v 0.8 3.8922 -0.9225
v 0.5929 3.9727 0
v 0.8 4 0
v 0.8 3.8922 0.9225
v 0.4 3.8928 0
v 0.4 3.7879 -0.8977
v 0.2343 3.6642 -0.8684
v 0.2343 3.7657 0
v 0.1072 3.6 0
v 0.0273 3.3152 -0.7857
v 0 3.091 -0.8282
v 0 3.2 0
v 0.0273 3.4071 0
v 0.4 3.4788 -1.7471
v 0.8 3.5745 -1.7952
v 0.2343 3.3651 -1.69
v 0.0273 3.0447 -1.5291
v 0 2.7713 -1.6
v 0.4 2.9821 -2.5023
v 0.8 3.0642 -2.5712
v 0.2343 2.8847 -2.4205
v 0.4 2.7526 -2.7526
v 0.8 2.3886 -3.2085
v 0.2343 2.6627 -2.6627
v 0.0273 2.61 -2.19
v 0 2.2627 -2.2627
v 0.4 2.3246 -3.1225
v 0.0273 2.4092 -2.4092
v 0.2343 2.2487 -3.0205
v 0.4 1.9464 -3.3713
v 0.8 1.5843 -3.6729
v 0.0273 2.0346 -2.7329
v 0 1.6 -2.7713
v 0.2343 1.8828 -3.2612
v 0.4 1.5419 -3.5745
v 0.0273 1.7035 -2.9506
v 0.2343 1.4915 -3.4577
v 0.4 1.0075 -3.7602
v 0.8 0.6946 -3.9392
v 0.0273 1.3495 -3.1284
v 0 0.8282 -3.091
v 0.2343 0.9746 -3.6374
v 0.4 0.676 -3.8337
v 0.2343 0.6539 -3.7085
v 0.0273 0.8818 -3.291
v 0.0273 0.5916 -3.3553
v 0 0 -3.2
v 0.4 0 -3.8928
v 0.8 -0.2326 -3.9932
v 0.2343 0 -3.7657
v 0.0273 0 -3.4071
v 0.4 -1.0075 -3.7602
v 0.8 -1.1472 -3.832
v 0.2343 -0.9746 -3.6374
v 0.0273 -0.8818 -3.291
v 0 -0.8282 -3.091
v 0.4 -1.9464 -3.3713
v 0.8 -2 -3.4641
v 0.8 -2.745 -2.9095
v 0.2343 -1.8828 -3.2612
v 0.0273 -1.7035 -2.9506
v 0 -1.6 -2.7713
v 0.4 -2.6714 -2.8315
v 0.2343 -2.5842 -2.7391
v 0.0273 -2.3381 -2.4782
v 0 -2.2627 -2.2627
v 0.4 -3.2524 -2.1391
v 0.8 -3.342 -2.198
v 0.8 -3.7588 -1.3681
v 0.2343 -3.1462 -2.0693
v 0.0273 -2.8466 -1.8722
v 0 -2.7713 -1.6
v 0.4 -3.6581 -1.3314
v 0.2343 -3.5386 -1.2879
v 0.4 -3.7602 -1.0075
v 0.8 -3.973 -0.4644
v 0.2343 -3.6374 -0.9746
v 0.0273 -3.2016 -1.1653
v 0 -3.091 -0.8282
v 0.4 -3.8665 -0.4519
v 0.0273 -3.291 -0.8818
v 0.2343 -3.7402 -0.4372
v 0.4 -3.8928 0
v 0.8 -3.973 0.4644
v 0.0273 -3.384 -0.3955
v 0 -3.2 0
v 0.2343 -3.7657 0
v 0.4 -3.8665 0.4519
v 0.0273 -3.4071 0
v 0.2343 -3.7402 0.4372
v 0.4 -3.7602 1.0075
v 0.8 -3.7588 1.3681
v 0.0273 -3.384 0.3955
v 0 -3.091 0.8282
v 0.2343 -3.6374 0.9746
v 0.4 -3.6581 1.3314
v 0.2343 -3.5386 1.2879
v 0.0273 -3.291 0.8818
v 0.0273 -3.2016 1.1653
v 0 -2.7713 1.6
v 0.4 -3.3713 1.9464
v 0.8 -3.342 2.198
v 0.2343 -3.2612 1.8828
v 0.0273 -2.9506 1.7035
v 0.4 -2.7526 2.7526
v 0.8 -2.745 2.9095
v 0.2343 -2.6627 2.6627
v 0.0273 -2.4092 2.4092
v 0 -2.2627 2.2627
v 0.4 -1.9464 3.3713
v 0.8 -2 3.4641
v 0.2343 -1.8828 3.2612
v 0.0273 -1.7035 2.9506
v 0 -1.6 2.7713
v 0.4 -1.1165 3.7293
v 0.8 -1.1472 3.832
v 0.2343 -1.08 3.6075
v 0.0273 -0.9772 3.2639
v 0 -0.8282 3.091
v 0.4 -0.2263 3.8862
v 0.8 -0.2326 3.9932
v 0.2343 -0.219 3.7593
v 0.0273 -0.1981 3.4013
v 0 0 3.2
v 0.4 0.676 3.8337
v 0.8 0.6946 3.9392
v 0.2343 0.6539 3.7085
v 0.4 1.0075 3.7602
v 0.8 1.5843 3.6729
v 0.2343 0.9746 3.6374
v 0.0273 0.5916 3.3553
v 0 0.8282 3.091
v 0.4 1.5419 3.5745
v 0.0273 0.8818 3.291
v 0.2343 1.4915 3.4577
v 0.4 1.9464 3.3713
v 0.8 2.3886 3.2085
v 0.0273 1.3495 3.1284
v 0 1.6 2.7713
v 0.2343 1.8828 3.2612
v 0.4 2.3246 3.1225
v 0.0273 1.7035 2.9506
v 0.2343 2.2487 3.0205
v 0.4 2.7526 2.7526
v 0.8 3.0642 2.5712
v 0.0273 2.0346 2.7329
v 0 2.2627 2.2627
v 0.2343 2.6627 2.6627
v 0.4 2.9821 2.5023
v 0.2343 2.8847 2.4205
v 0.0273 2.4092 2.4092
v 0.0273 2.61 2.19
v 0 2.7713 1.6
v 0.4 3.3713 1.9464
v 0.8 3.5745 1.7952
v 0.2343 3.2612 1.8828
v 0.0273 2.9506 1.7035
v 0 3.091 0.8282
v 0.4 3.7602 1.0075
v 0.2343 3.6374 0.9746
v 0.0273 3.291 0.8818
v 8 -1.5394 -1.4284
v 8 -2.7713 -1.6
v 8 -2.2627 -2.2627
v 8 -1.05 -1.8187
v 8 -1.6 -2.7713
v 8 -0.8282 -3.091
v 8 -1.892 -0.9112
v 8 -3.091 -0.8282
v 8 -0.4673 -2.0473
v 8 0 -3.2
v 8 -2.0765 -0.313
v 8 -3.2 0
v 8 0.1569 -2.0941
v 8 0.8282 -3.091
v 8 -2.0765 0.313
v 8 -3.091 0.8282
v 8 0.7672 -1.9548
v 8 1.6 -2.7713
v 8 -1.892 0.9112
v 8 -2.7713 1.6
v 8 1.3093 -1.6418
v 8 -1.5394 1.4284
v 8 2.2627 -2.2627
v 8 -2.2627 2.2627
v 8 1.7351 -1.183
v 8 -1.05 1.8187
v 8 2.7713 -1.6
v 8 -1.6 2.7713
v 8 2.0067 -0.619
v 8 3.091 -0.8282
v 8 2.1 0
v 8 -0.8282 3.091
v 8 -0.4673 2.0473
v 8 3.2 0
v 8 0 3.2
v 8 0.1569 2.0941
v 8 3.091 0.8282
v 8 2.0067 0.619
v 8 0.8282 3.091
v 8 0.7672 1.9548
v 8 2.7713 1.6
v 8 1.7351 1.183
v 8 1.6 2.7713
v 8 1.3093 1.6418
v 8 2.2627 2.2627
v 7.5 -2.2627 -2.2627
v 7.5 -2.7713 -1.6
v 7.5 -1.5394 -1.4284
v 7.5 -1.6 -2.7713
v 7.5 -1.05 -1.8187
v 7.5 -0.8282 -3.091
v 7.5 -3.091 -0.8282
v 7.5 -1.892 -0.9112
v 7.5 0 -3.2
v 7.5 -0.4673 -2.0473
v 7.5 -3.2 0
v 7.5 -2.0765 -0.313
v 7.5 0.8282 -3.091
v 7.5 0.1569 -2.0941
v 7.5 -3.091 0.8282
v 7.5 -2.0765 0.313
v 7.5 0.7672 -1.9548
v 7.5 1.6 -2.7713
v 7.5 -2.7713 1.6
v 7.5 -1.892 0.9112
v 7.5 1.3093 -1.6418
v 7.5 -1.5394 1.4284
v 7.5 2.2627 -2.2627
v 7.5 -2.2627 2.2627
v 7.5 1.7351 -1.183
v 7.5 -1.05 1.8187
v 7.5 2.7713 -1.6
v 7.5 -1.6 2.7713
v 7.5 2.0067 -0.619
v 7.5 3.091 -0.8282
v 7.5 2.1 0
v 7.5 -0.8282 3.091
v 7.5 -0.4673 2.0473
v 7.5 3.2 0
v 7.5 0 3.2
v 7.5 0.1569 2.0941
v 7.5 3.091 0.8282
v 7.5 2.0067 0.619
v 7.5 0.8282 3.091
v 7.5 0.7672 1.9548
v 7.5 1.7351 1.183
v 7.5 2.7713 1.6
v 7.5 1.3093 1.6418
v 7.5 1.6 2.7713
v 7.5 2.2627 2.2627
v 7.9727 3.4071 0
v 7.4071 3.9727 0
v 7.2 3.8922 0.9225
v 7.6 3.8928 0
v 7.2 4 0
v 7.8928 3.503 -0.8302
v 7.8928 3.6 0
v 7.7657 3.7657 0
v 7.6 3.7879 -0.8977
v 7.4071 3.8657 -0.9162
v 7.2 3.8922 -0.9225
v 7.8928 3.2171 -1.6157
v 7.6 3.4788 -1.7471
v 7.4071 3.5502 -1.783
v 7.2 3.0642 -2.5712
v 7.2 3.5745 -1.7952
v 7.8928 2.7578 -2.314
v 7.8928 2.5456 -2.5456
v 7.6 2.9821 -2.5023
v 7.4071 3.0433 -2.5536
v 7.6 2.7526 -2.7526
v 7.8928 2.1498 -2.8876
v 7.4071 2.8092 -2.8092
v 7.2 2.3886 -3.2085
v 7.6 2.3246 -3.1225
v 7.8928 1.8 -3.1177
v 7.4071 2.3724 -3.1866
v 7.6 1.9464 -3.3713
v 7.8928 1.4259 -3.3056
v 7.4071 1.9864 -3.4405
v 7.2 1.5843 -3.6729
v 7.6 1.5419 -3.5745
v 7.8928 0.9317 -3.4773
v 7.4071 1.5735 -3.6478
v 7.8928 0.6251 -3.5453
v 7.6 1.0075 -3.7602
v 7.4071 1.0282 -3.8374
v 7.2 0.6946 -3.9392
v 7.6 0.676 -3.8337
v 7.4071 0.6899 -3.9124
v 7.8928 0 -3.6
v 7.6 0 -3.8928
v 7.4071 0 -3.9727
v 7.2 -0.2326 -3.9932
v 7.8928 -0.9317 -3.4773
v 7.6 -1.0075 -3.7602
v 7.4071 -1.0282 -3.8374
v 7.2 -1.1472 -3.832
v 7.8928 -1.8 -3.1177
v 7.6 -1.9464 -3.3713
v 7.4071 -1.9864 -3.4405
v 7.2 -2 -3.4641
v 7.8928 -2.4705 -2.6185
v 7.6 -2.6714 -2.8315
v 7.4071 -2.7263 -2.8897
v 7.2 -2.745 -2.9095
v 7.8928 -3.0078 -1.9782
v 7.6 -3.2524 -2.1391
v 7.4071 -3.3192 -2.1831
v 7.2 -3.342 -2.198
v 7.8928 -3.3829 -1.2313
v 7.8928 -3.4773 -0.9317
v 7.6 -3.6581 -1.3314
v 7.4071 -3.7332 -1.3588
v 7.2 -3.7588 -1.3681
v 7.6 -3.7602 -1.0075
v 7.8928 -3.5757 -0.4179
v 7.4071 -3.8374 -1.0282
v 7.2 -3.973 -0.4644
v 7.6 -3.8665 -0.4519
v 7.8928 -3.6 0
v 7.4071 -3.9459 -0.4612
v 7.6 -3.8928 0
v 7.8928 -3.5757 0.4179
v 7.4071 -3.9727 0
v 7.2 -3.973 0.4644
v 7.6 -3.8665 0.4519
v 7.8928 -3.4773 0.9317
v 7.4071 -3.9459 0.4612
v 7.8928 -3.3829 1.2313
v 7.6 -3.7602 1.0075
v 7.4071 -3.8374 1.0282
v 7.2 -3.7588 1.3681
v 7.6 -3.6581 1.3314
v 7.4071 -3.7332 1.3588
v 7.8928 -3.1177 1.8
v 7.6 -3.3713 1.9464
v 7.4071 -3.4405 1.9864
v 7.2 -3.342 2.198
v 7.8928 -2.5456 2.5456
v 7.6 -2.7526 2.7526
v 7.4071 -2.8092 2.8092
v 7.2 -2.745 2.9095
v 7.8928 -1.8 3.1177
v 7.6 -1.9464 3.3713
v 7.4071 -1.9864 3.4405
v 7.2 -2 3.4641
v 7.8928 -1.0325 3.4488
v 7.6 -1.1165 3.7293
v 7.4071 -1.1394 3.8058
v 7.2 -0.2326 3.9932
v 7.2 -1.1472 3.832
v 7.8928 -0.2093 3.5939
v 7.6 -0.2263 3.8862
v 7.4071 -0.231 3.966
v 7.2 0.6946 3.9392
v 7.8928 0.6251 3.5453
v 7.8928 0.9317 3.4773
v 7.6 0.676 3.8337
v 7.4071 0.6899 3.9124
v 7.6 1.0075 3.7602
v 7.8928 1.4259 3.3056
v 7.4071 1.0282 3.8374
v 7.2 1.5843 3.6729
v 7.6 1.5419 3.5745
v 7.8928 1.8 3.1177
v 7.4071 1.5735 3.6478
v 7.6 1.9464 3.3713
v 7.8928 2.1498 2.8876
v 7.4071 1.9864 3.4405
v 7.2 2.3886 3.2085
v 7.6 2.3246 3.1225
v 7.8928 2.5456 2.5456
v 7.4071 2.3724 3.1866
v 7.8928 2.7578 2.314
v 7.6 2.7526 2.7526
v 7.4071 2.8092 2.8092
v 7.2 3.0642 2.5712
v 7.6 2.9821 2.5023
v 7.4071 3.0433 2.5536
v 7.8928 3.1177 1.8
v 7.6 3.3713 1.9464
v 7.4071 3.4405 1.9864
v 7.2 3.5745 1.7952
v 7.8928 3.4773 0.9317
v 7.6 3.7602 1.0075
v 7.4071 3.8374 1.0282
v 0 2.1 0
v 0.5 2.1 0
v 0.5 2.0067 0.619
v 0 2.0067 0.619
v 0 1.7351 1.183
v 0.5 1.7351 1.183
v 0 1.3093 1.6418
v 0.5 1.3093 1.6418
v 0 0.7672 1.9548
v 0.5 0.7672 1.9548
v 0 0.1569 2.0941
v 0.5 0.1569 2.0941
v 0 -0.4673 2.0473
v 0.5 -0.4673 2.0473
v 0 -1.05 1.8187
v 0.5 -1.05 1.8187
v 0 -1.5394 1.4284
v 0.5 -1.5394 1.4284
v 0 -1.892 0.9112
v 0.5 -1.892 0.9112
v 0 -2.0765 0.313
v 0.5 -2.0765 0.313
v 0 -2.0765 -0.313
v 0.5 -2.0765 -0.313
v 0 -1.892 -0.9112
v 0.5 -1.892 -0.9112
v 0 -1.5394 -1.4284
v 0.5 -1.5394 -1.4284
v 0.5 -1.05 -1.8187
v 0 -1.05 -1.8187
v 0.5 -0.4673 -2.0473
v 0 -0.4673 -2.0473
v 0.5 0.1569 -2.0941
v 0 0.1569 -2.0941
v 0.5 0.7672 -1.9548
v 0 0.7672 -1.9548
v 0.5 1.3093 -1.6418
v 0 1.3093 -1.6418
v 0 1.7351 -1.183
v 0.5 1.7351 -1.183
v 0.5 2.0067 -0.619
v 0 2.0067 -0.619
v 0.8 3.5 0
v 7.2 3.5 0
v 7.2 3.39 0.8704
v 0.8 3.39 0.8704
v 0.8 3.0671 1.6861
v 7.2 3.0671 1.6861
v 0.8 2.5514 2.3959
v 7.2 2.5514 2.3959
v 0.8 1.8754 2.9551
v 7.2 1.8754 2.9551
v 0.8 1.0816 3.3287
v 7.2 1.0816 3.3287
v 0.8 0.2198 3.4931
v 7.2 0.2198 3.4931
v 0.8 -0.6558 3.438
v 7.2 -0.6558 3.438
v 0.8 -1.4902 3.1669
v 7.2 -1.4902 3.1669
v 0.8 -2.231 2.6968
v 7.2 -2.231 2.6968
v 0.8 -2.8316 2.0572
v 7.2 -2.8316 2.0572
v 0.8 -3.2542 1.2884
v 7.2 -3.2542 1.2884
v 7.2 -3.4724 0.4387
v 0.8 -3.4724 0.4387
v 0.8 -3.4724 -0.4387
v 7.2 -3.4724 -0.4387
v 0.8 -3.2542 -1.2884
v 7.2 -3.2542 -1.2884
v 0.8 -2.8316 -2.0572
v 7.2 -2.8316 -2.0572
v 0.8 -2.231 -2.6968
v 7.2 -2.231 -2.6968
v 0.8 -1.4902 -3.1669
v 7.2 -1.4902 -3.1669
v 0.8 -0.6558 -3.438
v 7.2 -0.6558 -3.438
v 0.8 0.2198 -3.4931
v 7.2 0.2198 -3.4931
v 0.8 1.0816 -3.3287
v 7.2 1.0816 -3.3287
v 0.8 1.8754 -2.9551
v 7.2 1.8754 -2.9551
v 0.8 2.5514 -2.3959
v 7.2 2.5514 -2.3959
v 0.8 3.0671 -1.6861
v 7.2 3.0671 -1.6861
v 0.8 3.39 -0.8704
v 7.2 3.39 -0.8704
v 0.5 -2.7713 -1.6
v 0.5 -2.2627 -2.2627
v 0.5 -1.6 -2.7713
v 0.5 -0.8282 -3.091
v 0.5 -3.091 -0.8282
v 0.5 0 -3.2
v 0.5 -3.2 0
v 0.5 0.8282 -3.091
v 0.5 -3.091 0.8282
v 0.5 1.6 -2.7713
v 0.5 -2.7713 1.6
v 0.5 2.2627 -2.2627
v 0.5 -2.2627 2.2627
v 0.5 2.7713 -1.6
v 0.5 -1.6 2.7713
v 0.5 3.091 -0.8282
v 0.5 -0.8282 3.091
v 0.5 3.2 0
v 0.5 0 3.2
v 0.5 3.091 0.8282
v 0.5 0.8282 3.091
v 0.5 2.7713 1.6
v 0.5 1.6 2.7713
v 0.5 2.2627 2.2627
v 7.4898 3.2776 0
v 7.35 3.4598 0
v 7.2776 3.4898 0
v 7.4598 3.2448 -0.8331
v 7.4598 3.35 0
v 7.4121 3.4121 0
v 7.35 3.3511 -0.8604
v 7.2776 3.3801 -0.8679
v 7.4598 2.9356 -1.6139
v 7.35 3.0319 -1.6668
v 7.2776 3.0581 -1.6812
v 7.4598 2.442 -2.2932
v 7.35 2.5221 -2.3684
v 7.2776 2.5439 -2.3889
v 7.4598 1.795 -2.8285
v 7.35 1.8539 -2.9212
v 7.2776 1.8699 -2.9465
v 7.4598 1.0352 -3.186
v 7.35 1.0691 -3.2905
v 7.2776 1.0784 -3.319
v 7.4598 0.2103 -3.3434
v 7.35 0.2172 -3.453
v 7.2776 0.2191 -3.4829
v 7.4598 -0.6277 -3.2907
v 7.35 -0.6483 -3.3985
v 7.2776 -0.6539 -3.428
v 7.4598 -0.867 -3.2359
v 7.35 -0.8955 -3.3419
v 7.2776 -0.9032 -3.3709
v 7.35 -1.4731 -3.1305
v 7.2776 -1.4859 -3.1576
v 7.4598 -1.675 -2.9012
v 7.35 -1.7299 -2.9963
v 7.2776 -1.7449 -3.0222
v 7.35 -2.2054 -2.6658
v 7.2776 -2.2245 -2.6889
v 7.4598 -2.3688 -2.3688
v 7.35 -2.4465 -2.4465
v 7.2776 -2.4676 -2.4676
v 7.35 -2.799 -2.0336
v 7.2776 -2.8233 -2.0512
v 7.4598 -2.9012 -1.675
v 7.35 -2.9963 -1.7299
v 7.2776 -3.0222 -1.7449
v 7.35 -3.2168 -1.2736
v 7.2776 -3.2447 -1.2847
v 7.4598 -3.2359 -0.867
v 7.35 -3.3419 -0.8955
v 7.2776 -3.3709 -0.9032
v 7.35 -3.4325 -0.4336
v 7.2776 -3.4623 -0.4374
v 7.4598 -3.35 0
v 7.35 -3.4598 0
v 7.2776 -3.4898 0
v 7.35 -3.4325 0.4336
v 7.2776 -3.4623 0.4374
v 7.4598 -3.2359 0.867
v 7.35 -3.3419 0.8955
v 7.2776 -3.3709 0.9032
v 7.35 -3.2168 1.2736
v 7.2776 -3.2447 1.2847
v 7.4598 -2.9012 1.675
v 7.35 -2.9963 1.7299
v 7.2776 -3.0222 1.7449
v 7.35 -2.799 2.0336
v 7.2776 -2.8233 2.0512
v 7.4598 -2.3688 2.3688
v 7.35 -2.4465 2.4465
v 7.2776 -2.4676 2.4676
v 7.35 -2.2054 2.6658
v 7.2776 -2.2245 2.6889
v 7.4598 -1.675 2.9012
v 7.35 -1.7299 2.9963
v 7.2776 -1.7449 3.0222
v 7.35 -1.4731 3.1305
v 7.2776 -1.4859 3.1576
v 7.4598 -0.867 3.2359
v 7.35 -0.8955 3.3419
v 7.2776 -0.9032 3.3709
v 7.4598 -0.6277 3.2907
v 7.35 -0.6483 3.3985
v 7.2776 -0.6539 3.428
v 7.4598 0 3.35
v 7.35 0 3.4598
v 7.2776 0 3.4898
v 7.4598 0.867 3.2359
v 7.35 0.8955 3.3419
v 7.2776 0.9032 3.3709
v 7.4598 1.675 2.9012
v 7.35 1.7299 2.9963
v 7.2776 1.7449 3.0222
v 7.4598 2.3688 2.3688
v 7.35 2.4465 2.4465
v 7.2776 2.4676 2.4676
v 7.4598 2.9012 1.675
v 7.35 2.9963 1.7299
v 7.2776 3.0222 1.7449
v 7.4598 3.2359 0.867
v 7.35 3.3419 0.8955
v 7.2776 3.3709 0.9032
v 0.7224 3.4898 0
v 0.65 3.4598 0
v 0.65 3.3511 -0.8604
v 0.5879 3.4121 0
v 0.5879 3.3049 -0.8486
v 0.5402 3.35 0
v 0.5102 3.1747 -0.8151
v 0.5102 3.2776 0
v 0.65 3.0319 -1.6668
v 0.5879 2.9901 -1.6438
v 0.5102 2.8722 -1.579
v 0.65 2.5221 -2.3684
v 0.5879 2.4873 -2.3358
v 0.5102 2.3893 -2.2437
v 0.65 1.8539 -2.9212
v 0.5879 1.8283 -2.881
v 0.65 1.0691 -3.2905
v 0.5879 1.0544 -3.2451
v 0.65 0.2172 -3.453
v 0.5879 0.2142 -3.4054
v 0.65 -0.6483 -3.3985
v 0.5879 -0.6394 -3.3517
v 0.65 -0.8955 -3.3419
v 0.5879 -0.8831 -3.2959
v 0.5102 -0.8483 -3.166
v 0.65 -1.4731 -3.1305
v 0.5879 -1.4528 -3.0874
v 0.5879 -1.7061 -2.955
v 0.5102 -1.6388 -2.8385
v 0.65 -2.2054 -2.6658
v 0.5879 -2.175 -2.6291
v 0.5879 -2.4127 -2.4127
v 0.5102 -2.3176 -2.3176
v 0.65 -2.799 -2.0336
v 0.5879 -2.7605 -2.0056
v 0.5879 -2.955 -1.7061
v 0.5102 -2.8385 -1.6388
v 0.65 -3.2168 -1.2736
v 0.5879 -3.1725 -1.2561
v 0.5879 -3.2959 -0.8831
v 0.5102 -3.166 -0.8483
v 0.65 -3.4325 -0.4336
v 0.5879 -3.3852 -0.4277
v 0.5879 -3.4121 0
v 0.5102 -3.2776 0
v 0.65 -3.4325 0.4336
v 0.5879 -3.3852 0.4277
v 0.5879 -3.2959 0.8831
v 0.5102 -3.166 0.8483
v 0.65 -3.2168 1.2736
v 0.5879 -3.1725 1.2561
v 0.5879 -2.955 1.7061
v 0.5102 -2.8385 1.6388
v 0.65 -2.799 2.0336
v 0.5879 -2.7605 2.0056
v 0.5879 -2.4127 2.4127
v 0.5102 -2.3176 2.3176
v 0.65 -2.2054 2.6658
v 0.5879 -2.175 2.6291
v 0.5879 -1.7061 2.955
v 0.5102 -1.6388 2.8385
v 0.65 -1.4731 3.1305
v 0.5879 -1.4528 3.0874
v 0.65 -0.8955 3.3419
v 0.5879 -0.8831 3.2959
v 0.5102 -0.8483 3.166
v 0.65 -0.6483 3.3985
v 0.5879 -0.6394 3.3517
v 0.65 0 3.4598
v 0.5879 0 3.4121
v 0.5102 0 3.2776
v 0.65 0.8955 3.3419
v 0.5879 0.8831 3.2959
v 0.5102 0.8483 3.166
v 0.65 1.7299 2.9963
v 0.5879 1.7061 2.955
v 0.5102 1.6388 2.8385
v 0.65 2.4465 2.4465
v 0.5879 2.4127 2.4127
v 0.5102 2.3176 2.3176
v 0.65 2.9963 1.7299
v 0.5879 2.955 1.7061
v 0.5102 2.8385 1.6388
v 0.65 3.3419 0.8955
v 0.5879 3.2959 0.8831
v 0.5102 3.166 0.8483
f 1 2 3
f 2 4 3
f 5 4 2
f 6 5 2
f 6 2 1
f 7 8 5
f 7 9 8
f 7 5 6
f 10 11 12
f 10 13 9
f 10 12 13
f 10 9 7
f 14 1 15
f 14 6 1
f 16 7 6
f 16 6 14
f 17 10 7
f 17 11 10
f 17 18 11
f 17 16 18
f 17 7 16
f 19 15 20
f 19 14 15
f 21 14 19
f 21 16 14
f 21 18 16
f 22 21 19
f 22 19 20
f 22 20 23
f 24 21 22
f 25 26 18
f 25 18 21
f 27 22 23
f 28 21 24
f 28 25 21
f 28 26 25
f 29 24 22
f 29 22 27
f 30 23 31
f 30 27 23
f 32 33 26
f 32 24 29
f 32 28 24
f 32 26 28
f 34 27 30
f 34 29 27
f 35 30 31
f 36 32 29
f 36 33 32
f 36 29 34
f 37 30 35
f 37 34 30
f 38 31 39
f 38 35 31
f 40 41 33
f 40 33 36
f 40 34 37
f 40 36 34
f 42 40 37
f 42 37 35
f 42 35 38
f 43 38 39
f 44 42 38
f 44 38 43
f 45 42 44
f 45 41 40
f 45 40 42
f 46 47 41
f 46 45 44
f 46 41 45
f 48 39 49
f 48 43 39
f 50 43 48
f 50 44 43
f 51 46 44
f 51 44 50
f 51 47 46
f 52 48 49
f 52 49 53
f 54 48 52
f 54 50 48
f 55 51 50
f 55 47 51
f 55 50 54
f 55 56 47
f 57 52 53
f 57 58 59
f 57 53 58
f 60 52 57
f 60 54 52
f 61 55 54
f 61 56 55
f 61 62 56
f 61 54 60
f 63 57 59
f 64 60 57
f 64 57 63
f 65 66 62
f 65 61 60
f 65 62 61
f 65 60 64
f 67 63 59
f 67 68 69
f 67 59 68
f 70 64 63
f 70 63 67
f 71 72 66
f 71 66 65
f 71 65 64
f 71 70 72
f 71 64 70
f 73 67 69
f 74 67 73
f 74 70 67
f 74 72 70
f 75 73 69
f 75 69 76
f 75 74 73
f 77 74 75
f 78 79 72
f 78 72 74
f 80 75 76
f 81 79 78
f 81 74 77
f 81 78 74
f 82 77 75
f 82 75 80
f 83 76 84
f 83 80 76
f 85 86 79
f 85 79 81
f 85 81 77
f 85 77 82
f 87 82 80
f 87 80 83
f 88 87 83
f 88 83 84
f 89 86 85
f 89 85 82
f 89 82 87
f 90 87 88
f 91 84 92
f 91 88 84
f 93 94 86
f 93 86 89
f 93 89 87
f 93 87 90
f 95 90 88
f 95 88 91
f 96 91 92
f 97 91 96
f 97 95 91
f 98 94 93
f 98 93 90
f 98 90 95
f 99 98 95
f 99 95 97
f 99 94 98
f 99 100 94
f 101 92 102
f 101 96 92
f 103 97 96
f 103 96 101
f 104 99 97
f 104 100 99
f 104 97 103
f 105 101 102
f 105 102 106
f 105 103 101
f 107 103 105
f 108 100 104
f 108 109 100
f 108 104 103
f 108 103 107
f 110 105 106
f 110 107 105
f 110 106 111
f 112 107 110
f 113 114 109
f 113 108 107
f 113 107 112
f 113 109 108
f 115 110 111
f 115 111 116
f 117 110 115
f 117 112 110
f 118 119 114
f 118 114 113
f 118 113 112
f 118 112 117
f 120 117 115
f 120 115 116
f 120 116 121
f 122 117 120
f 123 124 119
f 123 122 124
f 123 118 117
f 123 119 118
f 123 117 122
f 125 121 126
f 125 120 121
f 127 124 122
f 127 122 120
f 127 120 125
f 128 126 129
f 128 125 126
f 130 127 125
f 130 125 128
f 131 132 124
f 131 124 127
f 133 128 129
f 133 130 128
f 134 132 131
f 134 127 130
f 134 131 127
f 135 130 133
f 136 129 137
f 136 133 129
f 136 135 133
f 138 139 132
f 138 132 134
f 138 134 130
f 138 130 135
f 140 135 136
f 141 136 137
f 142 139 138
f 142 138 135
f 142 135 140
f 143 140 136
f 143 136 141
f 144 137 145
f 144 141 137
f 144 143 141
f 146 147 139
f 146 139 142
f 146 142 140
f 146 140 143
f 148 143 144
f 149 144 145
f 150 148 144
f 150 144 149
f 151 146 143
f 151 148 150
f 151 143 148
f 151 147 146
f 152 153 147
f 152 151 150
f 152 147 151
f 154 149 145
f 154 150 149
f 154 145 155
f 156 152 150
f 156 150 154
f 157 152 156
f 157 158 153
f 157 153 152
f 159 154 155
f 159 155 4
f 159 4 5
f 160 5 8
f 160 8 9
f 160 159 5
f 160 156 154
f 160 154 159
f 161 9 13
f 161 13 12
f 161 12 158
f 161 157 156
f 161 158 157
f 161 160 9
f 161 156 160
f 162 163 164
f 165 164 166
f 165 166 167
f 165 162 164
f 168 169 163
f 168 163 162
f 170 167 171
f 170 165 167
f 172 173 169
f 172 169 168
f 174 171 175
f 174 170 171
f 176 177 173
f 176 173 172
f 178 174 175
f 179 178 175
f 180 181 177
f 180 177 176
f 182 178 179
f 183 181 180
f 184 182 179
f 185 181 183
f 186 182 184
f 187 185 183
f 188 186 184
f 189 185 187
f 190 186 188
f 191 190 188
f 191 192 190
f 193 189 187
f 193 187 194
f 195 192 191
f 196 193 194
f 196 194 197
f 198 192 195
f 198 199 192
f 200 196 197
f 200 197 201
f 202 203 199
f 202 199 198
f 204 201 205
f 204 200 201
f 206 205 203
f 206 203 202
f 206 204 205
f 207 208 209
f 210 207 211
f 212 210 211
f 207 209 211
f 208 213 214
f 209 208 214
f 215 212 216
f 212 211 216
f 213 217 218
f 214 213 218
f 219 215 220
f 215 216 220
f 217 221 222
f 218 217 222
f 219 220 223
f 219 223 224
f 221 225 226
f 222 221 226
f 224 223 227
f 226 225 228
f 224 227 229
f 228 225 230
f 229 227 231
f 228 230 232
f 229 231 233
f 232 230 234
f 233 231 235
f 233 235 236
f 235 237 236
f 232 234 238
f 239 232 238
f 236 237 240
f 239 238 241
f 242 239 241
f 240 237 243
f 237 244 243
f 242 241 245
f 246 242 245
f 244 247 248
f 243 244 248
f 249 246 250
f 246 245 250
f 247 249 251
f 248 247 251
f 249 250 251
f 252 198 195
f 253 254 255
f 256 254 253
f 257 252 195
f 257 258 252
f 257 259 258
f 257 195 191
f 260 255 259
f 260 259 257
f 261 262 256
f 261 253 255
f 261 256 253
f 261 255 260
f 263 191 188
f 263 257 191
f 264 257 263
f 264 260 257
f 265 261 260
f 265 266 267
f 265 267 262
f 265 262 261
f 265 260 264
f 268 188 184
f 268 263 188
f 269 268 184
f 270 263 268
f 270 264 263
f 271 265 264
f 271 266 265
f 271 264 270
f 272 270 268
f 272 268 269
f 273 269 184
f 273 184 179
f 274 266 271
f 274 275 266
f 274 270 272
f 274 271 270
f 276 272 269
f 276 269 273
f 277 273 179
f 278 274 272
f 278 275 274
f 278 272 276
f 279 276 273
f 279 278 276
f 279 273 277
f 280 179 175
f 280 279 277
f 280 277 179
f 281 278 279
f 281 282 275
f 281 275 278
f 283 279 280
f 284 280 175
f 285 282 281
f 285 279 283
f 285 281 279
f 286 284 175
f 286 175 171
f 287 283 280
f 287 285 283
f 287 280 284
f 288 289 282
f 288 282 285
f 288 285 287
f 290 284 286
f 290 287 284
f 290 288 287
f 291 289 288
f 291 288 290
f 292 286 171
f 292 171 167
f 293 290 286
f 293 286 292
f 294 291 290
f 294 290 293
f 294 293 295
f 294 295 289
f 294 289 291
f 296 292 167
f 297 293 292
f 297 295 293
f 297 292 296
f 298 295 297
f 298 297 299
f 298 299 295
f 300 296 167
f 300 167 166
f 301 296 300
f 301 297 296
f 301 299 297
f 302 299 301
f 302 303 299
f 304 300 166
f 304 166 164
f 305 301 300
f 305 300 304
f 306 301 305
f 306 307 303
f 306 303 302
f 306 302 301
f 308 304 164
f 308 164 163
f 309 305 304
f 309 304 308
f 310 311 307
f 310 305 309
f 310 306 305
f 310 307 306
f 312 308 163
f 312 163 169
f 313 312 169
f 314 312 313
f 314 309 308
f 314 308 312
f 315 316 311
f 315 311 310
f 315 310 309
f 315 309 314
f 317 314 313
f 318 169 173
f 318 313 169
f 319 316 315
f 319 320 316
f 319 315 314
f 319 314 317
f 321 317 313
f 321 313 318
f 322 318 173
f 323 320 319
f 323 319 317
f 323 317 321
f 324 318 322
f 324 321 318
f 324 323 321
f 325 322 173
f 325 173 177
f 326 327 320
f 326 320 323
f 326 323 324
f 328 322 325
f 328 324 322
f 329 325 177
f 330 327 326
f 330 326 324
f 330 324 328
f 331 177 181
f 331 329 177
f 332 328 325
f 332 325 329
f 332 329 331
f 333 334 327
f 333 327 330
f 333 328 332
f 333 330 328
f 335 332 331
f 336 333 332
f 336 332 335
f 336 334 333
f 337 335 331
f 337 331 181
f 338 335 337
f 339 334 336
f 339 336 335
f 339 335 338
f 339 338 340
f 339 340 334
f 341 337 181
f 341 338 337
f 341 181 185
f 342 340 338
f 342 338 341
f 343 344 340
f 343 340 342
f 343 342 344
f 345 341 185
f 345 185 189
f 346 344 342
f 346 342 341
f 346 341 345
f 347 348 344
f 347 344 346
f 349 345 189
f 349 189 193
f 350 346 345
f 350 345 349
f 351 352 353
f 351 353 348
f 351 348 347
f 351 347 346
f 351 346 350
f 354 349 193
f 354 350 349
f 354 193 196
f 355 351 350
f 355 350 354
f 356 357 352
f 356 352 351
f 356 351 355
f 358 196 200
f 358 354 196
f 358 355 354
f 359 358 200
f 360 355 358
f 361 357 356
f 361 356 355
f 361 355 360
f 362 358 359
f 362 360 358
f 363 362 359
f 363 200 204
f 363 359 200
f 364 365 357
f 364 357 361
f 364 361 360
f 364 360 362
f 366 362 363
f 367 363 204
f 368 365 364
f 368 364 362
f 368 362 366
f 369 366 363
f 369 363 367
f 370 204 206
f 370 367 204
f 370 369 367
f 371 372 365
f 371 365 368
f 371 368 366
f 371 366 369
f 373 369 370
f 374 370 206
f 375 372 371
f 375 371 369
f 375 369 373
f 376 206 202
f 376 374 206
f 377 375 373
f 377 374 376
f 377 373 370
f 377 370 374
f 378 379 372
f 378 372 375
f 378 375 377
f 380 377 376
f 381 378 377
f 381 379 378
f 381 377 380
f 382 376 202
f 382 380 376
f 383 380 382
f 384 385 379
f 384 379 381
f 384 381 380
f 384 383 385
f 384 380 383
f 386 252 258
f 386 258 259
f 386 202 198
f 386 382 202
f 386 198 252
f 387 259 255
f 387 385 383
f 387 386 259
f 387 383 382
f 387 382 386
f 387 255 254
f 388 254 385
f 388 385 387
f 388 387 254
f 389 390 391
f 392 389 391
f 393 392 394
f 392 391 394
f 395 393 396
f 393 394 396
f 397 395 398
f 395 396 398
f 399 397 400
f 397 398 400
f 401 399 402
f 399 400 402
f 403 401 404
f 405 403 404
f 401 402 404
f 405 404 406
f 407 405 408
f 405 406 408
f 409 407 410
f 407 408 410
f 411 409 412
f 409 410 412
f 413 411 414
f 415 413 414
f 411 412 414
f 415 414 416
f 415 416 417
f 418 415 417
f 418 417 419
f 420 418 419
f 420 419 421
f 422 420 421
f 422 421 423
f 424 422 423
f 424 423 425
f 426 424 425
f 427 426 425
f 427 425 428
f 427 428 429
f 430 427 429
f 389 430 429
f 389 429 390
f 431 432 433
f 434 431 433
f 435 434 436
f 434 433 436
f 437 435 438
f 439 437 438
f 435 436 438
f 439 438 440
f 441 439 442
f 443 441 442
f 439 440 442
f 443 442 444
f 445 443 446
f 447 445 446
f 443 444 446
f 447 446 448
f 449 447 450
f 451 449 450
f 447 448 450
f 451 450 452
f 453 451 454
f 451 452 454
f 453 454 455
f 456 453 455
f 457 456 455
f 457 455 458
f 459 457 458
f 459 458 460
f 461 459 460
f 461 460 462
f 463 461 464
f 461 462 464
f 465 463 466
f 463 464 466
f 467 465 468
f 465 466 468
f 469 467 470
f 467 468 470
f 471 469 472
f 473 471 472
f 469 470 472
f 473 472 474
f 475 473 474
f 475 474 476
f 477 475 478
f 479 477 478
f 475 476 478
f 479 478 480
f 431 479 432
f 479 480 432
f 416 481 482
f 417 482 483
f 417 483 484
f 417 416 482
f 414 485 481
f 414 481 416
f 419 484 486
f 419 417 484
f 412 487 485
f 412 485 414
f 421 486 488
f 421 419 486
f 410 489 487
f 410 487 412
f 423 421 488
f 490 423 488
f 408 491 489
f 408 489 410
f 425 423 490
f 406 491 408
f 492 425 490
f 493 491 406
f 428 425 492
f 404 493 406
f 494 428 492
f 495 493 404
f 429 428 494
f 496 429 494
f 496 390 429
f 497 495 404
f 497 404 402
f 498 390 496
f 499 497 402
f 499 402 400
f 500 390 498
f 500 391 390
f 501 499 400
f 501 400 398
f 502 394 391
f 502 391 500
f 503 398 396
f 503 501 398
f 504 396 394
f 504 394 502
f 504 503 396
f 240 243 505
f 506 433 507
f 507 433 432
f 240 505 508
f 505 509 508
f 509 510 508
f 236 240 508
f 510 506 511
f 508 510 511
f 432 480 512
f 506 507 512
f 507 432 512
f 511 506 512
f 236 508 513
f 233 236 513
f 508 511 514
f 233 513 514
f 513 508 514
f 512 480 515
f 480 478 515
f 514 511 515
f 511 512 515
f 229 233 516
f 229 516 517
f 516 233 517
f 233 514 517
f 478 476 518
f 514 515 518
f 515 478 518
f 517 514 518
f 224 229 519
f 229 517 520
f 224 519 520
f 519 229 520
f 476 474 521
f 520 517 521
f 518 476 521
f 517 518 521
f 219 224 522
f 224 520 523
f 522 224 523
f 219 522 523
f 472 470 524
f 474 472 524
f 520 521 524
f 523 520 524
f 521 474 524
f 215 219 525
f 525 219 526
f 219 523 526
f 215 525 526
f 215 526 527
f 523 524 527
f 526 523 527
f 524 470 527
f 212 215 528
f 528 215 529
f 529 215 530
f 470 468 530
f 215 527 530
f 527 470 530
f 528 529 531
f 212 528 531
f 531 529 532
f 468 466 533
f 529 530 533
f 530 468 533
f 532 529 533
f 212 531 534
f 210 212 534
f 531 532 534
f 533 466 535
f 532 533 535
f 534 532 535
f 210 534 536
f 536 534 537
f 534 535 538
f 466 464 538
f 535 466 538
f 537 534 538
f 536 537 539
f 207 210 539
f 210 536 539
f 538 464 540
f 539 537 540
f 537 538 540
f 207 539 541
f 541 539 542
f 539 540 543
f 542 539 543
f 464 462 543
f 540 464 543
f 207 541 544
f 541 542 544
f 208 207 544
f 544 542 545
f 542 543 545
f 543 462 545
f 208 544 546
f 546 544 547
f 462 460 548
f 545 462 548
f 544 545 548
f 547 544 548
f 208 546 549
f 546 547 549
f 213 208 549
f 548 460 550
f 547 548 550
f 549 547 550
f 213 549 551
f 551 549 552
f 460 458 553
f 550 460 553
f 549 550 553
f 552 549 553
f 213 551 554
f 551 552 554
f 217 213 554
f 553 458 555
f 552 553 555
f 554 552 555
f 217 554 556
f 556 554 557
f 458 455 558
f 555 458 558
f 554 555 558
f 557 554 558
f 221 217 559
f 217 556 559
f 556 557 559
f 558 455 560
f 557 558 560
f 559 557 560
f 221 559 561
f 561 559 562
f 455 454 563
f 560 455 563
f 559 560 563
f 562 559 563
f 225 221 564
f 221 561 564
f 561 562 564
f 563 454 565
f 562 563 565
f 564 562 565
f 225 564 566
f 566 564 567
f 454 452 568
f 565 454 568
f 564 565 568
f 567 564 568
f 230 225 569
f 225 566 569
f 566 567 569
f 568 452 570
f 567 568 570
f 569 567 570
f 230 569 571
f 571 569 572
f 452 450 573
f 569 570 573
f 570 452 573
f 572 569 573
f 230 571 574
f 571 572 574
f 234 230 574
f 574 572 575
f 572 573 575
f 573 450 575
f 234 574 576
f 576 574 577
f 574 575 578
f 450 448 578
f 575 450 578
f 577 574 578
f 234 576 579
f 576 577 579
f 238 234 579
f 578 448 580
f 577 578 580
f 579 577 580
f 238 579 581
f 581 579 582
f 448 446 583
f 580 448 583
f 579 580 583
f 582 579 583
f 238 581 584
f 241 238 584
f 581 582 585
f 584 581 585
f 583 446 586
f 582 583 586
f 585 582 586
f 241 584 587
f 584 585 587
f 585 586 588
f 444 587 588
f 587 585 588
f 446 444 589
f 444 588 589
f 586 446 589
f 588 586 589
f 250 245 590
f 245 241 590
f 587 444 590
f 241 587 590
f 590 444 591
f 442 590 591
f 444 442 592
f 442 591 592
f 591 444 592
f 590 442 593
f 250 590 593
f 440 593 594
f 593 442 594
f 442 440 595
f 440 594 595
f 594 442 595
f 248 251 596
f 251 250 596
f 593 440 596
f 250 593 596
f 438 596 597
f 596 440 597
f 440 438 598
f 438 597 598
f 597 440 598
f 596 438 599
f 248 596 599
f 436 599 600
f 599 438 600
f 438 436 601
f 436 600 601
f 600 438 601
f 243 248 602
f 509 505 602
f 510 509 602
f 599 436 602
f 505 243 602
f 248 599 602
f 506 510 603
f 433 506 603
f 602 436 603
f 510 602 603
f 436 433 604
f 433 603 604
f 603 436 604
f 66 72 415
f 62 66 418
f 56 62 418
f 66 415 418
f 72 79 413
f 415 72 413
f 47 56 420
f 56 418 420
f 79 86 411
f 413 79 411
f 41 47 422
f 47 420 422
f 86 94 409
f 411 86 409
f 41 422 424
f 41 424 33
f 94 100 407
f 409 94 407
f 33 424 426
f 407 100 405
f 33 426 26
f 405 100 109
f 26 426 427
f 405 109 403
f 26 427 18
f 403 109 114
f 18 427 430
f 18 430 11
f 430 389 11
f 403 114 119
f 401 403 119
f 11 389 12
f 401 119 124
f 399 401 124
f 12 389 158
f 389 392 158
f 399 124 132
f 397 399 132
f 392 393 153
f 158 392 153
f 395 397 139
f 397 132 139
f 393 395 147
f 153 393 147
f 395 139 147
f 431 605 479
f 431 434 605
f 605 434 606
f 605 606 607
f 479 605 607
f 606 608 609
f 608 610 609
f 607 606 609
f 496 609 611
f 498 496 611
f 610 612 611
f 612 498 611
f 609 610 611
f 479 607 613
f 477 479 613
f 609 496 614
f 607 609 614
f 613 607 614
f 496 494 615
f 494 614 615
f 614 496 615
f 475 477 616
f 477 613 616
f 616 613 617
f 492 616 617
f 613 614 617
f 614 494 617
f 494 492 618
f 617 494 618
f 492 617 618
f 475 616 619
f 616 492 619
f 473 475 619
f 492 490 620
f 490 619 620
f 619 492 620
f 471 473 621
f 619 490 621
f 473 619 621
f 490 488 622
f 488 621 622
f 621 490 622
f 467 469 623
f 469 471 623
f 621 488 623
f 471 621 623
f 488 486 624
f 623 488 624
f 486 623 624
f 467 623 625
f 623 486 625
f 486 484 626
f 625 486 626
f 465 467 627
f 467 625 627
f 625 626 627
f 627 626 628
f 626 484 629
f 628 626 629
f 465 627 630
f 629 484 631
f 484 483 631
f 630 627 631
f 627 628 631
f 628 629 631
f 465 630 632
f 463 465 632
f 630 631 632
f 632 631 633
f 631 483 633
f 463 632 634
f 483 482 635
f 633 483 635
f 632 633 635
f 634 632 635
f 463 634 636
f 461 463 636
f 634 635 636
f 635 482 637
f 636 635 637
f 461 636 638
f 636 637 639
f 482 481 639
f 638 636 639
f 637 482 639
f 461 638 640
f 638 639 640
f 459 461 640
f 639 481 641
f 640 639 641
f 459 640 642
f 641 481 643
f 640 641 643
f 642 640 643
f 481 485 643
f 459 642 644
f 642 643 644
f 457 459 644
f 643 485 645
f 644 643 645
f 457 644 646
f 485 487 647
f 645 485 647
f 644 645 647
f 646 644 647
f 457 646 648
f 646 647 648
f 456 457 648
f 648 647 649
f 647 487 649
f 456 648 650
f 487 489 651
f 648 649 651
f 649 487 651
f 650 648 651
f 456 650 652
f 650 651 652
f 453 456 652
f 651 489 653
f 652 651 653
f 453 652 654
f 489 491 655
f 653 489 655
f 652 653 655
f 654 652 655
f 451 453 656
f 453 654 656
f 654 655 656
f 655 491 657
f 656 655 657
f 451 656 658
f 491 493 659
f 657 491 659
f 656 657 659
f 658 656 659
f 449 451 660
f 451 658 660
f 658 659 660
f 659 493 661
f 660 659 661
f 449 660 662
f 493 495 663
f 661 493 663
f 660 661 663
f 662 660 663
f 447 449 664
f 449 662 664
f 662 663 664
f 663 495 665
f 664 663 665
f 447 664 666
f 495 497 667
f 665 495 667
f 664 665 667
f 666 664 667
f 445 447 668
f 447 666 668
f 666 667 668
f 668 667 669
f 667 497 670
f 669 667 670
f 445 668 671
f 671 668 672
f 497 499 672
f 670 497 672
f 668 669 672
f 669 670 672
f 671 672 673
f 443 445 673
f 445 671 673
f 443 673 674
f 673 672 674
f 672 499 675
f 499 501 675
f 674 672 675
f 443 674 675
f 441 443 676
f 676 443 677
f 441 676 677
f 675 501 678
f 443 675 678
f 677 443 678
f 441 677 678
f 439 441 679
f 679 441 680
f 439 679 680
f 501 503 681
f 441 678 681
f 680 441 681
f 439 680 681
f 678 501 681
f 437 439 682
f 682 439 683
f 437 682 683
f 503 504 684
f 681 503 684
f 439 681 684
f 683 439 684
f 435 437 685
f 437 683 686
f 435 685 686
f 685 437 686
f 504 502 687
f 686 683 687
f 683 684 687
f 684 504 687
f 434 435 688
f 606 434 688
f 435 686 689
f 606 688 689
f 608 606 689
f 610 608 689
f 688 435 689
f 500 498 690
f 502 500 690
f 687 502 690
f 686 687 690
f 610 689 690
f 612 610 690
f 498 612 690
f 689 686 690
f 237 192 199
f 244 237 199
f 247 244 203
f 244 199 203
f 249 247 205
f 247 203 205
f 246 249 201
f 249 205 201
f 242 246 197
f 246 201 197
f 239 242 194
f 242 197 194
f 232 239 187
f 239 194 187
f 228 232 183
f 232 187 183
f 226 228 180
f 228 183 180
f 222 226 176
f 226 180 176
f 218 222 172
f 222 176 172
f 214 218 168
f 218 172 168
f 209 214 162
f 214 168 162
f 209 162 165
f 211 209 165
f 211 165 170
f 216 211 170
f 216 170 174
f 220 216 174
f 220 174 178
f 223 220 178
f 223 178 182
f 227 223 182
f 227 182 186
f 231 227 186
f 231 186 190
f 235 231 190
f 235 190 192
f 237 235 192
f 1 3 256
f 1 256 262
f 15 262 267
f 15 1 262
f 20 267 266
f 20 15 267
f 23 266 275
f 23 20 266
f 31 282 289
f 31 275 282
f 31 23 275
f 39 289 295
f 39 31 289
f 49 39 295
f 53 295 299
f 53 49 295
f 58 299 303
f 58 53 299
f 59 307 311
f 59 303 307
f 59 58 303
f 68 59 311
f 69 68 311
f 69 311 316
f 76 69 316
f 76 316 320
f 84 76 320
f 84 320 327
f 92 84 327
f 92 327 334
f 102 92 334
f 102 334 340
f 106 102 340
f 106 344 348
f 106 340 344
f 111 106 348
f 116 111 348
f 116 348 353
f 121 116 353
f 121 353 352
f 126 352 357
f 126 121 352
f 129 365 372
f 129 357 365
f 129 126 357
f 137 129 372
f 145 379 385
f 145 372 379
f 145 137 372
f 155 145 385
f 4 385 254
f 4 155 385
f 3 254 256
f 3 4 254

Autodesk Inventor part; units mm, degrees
sketch "Sketch_1" plane through (0, 0, 0) normal (0, 0, 1) x (1, 0, 0)
  line L0 (8, 0) -> (0, 0)
  line L1 (0, 2.1) -> (0.5, 2.1)
  line L2 (0.5, 2.1) -> (0.5, 3.2)
  arc A0 (0.8, 3.5) -> (0.5, 3.2) centre (0.8, 3.2) ccw
  line L3 (0.8, 3.5) -> (7.2, 3.5)
  arc A1 (7.5, 3.2) -> (7.2, 3.5) centre (7.2, 3.2) ccw
  line L4 (7.5, 3.2) -> (7.5, 2.1)
  line L5 (7.5, 2.1) -> (8, 2.1)
  line L6 (8, 2.1) -> (8, 3.2)
  arc A2 (8, 3.2) -> (7.2, 4) centre (7.2, 3.2) ccw
  line L7 (7.2, 4) -> (0.8, 4)
  arc A3 (0.8, 4) -> (0, 3.2) centre (0.8, 3.2) ccw
  line L8 (0, 3.2) -> (0, 2.1)
revolve "Revolution1" add sketch "Sketch_1" angle 360 about axis through (8, 0, 0) along (1, 0, 0)
ref_plane "IP_1_XY" through (0, 0, 0) normal (1, 0, 0) x (0, 0, -1)
ref_plane "IP_1_YZ" through (0, 0, 0) normal (0, 0, -1) x (0, 1, 0)
ref_plane "IP_1_ZX" through (0, 0, 0) normal (0, 1, 0) x (1, 0, 0)
ref_plane "IP_5_XY" through (4, 0, 0) normal (1, 0, 0) x (0, 0, -1)
ref_plane "IP_5_YZ" through (4, 0, 0) normal (0, 0, -1) x (0, 1, 0)
ref_plane "IP_5_ZX" through (4, 0, 0) normal (0, 1, 0) x (1, 0, 0)
ref_plane "IP_6_XY" through (5.6, 0, 0) normal (1, 0, 0) x (0, 0, -1)
ref_plane "IP_6_YZ" through (5.6, 0, 0) normal (0, 0, -1) x (0, 1, 0)
ref_plane "IP_6_ZX" through (5.6, 0, 0) normal (0, 1, 0) x (1, 0, 0)
properties part number "HK0408FT2SH"
